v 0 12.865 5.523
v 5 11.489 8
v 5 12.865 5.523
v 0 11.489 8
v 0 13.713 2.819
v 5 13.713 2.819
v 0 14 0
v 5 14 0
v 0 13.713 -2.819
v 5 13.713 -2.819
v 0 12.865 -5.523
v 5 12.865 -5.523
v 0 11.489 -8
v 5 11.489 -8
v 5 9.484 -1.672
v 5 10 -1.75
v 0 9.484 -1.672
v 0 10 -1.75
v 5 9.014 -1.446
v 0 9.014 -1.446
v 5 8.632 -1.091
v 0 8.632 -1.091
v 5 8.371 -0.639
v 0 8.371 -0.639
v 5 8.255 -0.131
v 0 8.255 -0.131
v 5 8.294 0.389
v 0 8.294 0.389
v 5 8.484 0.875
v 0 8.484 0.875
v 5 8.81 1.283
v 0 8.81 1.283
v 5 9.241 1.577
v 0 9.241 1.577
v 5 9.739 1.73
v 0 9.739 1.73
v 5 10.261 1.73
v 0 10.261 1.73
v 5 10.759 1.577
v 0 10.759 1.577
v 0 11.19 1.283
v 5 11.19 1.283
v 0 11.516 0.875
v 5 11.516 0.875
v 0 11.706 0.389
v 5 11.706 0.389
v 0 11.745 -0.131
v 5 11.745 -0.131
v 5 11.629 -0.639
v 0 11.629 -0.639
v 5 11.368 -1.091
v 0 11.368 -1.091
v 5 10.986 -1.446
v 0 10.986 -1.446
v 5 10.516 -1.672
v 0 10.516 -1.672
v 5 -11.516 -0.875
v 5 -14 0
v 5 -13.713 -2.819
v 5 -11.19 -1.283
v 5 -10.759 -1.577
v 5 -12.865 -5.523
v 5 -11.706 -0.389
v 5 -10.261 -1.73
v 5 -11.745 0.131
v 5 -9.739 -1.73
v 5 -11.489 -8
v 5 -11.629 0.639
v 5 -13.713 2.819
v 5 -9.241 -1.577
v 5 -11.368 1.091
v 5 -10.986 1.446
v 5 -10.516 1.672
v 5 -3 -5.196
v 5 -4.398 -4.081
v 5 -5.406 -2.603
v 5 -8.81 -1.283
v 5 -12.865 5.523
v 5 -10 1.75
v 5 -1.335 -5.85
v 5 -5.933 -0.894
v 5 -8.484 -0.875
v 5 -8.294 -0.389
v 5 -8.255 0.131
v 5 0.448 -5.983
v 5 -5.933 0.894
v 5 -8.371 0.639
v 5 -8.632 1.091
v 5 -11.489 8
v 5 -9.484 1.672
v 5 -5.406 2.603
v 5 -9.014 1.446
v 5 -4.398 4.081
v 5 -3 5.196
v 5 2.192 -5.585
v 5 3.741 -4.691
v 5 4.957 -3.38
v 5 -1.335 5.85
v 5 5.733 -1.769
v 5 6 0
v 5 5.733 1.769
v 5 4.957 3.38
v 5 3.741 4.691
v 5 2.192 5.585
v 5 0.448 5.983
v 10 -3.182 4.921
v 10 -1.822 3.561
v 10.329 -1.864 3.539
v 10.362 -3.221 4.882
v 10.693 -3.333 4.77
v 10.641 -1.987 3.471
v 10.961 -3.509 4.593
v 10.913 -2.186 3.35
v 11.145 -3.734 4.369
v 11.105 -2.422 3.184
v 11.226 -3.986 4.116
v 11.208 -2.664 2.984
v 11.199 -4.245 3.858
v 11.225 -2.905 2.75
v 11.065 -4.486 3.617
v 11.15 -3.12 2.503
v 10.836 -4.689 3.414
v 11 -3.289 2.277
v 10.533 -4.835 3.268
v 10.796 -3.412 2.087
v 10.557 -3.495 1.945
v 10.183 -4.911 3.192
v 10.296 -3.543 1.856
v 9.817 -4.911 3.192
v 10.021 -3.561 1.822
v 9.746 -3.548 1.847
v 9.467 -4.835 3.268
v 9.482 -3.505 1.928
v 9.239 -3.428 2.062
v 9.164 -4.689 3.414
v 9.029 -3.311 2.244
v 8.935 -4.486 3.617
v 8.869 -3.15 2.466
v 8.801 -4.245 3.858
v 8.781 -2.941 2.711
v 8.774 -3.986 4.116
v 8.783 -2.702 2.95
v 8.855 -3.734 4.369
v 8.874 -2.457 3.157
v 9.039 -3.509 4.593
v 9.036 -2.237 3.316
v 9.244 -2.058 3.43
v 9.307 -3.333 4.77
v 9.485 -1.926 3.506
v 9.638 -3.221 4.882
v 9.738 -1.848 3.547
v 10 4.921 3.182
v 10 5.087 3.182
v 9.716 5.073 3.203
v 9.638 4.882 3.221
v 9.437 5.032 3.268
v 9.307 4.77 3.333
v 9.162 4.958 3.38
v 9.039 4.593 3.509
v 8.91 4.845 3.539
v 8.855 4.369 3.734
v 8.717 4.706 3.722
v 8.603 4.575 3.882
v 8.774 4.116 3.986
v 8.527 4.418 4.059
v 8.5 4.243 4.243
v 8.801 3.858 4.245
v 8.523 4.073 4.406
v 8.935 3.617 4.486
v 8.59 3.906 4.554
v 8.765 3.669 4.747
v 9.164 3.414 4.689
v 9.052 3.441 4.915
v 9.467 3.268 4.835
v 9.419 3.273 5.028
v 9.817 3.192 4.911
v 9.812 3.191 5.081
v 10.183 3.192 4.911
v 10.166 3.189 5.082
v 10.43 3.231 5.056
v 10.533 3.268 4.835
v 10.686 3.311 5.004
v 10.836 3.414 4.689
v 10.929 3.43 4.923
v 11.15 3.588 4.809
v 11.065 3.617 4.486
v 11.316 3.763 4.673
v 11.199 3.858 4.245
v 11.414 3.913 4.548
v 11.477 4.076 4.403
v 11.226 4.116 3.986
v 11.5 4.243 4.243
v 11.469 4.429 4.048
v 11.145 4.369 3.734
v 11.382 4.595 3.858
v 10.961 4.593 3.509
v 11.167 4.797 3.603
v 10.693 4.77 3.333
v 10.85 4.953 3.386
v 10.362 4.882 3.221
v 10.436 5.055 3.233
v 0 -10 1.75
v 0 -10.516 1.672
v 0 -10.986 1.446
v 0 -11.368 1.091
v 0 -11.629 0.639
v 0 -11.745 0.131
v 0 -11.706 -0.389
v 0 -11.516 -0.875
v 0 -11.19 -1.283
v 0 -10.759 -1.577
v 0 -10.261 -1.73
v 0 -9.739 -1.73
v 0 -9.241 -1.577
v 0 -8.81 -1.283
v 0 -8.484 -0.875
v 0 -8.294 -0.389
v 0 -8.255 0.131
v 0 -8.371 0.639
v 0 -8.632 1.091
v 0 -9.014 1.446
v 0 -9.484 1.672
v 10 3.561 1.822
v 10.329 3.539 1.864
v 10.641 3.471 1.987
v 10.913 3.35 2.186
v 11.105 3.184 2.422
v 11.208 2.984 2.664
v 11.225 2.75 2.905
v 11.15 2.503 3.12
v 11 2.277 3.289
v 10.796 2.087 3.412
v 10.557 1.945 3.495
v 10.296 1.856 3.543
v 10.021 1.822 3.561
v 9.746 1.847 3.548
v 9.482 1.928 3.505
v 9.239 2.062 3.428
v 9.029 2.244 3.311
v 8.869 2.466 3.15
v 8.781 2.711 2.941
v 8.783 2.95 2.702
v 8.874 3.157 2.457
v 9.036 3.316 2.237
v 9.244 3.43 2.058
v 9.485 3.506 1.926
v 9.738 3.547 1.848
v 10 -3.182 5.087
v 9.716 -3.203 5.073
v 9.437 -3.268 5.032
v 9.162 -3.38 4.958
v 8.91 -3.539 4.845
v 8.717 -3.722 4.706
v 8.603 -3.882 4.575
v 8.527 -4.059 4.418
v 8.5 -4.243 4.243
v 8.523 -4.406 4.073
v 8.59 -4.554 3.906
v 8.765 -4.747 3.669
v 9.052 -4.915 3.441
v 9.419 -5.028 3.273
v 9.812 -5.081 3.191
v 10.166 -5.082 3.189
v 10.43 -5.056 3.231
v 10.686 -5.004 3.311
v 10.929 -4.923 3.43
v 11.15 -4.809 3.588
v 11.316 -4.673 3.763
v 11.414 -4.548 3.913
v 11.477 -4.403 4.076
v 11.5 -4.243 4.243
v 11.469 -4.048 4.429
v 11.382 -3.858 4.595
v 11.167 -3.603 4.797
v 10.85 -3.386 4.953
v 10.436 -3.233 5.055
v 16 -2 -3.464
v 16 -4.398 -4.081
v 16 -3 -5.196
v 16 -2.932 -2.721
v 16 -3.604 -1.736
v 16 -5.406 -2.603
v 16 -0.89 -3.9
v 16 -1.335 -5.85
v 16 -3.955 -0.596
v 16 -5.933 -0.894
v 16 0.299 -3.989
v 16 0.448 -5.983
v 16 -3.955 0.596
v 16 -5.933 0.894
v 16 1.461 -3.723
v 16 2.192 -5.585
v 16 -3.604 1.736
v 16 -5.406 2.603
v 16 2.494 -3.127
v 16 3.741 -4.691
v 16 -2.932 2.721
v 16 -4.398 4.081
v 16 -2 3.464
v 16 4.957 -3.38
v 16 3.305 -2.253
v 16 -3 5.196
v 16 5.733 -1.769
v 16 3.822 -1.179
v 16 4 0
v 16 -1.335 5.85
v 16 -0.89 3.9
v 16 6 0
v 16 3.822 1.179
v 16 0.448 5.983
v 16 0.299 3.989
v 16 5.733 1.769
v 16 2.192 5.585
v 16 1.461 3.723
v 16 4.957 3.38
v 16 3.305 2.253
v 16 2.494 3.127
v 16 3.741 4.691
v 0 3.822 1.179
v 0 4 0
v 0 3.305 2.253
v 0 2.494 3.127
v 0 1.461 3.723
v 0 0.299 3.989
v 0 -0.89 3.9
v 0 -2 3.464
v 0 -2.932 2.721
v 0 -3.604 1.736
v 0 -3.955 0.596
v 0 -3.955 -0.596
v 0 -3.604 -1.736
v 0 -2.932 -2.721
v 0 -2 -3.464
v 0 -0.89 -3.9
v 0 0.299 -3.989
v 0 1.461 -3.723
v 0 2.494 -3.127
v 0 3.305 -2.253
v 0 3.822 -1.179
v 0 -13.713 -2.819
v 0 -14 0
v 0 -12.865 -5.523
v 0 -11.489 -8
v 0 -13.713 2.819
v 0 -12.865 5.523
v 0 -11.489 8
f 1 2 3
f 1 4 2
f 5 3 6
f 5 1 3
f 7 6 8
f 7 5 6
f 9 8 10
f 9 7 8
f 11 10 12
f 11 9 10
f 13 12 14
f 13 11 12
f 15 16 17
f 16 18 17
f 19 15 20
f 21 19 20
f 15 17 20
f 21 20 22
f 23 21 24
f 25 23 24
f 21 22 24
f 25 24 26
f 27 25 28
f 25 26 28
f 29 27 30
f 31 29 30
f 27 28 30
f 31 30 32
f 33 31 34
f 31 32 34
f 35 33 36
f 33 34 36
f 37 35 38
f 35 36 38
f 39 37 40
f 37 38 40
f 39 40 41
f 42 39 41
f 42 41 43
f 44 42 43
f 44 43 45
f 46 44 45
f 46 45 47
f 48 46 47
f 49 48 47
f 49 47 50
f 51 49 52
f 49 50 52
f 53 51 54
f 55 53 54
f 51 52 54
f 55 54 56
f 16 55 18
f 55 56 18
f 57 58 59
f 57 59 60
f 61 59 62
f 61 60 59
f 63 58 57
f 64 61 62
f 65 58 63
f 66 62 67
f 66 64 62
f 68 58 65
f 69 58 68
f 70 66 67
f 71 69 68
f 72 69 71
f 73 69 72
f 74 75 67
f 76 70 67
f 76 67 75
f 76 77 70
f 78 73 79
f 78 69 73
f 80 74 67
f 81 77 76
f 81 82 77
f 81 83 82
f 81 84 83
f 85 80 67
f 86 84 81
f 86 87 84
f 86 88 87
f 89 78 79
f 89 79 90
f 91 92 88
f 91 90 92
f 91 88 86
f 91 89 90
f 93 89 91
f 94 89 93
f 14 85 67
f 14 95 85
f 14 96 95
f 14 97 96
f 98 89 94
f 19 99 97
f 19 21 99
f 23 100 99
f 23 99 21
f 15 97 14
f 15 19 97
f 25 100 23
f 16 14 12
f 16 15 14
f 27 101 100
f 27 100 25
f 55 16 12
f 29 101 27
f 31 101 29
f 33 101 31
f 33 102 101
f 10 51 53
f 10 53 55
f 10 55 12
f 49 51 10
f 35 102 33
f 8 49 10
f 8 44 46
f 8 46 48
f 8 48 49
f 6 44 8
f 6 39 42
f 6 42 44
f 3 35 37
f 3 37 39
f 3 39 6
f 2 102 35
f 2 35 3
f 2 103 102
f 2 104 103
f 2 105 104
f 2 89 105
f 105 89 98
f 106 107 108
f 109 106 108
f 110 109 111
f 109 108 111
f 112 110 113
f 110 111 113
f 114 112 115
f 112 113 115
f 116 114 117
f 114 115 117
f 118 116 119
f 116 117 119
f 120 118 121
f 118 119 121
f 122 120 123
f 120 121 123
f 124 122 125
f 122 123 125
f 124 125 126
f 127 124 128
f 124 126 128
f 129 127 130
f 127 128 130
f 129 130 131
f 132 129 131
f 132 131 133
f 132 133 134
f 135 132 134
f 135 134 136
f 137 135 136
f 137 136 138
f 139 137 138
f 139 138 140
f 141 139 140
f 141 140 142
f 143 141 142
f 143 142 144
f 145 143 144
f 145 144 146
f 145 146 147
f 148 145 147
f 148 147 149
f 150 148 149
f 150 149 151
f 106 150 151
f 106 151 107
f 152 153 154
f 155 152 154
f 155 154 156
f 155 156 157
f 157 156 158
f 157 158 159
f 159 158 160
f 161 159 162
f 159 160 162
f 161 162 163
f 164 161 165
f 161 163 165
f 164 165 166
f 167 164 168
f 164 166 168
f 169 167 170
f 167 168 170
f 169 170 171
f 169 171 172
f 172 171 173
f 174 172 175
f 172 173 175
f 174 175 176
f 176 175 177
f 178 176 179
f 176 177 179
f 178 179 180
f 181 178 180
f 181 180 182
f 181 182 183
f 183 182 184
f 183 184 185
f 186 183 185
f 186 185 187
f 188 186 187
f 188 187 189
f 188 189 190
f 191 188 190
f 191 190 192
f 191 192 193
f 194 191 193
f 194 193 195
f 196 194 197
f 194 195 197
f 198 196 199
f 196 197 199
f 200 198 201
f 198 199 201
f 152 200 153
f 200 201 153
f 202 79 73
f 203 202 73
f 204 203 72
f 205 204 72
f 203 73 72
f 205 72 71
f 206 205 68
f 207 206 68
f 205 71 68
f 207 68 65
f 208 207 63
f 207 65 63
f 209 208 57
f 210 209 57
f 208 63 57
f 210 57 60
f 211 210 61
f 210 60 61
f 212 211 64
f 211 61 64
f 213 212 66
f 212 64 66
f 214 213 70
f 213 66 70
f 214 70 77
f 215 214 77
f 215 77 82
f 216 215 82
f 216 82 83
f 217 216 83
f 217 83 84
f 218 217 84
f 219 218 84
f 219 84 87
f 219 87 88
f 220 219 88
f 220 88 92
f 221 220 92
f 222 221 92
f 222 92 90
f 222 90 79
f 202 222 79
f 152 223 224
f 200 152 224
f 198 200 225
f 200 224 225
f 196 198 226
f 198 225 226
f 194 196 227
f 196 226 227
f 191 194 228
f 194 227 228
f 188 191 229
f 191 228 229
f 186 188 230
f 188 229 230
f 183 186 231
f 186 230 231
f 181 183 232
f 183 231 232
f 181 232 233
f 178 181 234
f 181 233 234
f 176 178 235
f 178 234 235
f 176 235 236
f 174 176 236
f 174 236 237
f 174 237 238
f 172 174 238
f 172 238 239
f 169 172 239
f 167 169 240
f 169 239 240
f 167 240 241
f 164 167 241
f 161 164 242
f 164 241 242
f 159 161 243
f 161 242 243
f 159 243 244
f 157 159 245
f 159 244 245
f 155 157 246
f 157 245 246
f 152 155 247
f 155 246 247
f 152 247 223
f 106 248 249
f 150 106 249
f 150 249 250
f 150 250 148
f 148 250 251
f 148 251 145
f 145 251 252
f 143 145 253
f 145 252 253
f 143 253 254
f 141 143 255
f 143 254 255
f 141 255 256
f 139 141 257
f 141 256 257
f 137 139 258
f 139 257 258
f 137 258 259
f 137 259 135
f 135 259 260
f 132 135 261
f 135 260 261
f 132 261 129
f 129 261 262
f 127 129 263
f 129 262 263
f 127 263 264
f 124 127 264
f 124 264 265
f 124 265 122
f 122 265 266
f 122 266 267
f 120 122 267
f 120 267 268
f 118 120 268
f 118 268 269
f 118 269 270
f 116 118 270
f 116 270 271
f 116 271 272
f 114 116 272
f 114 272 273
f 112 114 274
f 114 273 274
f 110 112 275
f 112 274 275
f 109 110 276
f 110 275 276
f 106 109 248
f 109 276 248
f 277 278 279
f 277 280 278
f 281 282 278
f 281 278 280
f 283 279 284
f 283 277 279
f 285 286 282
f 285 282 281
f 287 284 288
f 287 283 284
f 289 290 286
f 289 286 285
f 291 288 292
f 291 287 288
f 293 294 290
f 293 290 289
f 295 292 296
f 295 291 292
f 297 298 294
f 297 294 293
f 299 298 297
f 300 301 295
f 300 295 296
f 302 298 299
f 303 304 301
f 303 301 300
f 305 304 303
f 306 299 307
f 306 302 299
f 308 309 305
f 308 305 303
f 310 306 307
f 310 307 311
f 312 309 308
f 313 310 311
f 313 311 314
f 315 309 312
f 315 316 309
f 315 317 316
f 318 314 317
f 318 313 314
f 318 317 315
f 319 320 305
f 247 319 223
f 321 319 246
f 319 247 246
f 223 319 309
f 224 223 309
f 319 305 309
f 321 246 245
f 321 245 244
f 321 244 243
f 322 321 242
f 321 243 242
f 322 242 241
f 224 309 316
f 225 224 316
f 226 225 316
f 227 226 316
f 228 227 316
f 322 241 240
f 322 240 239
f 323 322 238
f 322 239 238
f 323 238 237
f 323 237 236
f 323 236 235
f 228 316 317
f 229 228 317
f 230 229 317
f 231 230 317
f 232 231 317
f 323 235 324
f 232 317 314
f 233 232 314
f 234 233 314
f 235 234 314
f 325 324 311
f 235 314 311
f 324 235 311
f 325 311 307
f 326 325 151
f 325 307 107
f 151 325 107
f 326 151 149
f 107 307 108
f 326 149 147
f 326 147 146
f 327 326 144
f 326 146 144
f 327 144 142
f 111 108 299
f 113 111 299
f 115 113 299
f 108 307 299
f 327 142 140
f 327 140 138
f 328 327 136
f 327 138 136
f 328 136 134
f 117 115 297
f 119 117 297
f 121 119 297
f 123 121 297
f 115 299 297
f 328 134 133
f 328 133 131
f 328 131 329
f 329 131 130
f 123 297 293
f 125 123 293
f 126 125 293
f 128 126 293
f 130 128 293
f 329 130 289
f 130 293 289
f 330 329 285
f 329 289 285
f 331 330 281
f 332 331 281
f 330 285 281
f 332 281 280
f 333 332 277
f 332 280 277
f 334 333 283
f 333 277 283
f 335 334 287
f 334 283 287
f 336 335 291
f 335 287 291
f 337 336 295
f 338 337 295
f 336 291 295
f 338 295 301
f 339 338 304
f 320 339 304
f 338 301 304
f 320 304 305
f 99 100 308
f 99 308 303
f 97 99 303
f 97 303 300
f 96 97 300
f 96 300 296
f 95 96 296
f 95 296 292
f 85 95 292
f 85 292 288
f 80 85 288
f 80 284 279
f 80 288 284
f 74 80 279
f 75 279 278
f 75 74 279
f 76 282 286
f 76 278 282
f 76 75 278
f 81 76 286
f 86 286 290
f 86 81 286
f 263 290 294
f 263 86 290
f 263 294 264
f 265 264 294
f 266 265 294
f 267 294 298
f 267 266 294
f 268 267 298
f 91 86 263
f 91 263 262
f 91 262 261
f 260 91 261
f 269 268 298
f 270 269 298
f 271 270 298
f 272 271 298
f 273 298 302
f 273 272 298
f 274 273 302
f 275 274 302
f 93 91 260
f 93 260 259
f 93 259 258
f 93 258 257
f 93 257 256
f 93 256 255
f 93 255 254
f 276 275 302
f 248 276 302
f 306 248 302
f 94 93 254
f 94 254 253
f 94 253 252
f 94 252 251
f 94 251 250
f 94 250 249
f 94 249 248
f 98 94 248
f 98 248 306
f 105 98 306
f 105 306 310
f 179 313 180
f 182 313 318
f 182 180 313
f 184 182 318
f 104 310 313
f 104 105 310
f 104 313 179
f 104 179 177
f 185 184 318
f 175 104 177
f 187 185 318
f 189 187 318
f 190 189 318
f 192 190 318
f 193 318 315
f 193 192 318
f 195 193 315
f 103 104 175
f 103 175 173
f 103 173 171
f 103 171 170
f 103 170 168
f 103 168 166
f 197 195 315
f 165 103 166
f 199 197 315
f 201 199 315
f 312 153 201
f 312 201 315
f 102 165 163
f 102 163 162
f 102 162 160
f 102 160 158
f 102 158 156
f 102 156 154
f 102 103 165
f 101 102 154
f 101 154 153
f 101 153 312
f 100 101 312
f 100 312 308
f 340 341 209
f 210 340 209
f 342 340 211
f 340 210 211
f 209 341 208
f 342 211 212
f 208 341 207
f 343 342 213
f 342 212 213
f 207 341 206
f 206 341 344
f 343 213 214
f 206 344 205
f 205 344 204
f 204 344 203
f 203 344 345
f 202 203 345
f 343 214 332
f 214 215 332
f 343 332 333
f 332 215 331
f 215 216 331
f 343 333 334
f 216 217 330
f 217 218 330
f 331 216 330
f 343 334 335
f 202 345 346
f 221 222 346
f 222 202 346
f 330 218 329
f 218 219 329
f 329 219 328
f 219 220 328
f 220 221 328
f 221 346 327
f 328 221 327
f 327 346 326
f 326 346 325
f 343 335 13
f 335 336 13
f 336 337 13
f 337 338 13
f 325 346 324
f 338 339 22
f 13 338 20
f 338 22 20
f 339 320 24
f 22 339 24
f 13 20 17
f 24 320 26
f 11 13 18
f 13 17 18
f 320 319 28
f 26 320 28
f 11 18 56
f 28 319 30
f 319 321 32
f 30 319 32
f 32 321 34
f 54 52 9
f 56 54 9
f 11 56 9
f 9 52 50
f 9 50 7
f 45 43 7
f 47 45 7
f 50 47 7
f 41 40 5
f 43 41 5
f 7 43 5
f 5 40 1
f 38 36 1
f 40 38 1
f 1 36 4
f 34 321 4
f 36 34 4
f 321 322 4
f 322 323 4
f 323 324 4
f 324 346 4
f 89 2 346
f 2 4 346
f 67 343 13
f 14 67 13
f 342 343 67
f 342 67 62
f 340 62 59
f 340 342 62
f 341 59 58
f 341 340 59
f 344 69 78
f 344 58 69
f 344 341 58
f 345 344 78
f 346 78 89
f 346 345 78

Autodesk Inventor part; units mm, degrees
sketch "Sketch_1" plane through (0, 0, 0) normal (0, 0, 1) x (1, 0, 0)
  line L0 (16, 0) -> (0, 0)
  line L1 (0, 4) -> (16, 4)
  line L2 (16, 4) -> (16, 6)
  line L3 (16, 6) -> (5, 6)
  line L4 (5, 6) -> (5, 14)
  line L5 (5, 14) -> (0, 14)
  line L6 (0, 14) -> (0, 4)
revolve "Revolution1" add sketch "Sketch_1" angle 360 about axis through (16, 0, 0) along (1, 0, 0)
sketch "Sketch_19" plane through (10, 0, 0) normal (1, 0, 0) x (0, 0, -1)
  line L0 (-2.1213, 2.1213) -> (-4.2426, 4.2426)
  line L1 (-4.2426, 4.2426) -> (-3.182, 5.3033)
  line L2 (-3.182, 5.3033) -> (-3.182, 4.9208)
  line L3 (-3.182, 4.9208) -> (-1.2519, 2.9907)
  line L4 (-1.2519, 2.9907) -> (-2.1213, 2.1213)
  line L5 (-2.1213, 2.1213) -> (-4.2426, 4.2426)
revolve "Revolution2" cut sketch "Sketch_19" angle 360 about axis through (10, 2.1213, 2.1213) along (0, -0.7071068, -0.7071068)
thread "Thread1" size "M3x0.5" class "6H" standard "ISO Metric profile" length 2.7295
sketch "Sketch_3" plane through (10, 0, 0) normal (1, 0, 0) x (0, 0, -1)
  line L0 (-2.1213, -2.1213) -> (-4.2426, -4.2426)
  line L1 (-4.2426, -4.2426) -> (-5.3033, -3.182)
  line L2 (-5.3033, -3.182) -> (-4.9208, -3.182)
  line L3 (-4.9208, -3.182) -> (-2.9907, -1.2519)
  line L4 (-2.9907, -1.2519) -> (-2.1213, -2.1213)
  line L5 (-2.1213, -2.1213) -> (-4.2426, -4.2426)
revolve "Revolution3" cut sketch "Sketch_3" angle 360 about axis through (10, -2.1213, 2.1213) along (0, 0.7071068, -0.7071068)
thread "Thread2" size "M3x0.5" class "6H" standard "ISO Metric profile" length 2.7295
sketch "Sketch4" plane through (5, 0, 0) normal (1, 0, 0) x (0, 0, -1)
  point P0 (0, 10)
hole "Hole1" at (5, 10, 0) direction (-1, 0, 0) diameter 3.5 depth 5
sketch "Sketch5" plane through (0, 0, 0) normal (-1, 0, 0) x (0, 0, 1)
  point P0 (0, -10)
hole "Hole2" at (0, -10, 0) direction (1, 0, 0) diameter 3.5 depth 5
sketch "Sketch_4" plane through (0, 0, 0) normal (1, 0, 0) x (0, 1, 0)
  circle A0 centre (0, 0) radius 150
  line L0 (50, 8) -> (-50, 8)
  line L1 (-50, 8) -> (-50, -8)
  line L2 (-50, -8) -> (50, -8)
  line L3 (50, -8) -> (50, 8)
extrude "Extrusion1" cut sketch "Sketch_4" along normal blind 16
ref_plane "to_screw1_XY" through (10, -2.8284, 2.8284) normal (0, -0.7071068, 0.7071068) x (1, 0, 0)
ref_plane "to_screw1_YZ" through (10, -2.8284, 2.8284) normal (1, 0, 0) x (0, 0.7071068, 0.7071068)
ref_plane "to_screw1_ZX" through (10, -2.8284, 2.8284) normal (0, 0.7071068, 0.7071068) x (0, -0.7071068, 0.7071068)
ref_plane "to_screw2_XY" through (10, 2.8284, 2.8284) normal (0, 0.7071068, 0.7071068) x (1, 0, 0)
ref_plane "to_screw2_YZ" through (10, 2.8284, 2.8284) normal (1, 0, 0) x (0, 0.7071068, -0.7071068)
ref_plane "to_screw2_ZX" through (10, 2.8284, 2.8284) normal (0, 0.7071068, -0.7071068) x (0, 0.7071068, 0.7071068)
properties part number "ATHC8-MB_b"
